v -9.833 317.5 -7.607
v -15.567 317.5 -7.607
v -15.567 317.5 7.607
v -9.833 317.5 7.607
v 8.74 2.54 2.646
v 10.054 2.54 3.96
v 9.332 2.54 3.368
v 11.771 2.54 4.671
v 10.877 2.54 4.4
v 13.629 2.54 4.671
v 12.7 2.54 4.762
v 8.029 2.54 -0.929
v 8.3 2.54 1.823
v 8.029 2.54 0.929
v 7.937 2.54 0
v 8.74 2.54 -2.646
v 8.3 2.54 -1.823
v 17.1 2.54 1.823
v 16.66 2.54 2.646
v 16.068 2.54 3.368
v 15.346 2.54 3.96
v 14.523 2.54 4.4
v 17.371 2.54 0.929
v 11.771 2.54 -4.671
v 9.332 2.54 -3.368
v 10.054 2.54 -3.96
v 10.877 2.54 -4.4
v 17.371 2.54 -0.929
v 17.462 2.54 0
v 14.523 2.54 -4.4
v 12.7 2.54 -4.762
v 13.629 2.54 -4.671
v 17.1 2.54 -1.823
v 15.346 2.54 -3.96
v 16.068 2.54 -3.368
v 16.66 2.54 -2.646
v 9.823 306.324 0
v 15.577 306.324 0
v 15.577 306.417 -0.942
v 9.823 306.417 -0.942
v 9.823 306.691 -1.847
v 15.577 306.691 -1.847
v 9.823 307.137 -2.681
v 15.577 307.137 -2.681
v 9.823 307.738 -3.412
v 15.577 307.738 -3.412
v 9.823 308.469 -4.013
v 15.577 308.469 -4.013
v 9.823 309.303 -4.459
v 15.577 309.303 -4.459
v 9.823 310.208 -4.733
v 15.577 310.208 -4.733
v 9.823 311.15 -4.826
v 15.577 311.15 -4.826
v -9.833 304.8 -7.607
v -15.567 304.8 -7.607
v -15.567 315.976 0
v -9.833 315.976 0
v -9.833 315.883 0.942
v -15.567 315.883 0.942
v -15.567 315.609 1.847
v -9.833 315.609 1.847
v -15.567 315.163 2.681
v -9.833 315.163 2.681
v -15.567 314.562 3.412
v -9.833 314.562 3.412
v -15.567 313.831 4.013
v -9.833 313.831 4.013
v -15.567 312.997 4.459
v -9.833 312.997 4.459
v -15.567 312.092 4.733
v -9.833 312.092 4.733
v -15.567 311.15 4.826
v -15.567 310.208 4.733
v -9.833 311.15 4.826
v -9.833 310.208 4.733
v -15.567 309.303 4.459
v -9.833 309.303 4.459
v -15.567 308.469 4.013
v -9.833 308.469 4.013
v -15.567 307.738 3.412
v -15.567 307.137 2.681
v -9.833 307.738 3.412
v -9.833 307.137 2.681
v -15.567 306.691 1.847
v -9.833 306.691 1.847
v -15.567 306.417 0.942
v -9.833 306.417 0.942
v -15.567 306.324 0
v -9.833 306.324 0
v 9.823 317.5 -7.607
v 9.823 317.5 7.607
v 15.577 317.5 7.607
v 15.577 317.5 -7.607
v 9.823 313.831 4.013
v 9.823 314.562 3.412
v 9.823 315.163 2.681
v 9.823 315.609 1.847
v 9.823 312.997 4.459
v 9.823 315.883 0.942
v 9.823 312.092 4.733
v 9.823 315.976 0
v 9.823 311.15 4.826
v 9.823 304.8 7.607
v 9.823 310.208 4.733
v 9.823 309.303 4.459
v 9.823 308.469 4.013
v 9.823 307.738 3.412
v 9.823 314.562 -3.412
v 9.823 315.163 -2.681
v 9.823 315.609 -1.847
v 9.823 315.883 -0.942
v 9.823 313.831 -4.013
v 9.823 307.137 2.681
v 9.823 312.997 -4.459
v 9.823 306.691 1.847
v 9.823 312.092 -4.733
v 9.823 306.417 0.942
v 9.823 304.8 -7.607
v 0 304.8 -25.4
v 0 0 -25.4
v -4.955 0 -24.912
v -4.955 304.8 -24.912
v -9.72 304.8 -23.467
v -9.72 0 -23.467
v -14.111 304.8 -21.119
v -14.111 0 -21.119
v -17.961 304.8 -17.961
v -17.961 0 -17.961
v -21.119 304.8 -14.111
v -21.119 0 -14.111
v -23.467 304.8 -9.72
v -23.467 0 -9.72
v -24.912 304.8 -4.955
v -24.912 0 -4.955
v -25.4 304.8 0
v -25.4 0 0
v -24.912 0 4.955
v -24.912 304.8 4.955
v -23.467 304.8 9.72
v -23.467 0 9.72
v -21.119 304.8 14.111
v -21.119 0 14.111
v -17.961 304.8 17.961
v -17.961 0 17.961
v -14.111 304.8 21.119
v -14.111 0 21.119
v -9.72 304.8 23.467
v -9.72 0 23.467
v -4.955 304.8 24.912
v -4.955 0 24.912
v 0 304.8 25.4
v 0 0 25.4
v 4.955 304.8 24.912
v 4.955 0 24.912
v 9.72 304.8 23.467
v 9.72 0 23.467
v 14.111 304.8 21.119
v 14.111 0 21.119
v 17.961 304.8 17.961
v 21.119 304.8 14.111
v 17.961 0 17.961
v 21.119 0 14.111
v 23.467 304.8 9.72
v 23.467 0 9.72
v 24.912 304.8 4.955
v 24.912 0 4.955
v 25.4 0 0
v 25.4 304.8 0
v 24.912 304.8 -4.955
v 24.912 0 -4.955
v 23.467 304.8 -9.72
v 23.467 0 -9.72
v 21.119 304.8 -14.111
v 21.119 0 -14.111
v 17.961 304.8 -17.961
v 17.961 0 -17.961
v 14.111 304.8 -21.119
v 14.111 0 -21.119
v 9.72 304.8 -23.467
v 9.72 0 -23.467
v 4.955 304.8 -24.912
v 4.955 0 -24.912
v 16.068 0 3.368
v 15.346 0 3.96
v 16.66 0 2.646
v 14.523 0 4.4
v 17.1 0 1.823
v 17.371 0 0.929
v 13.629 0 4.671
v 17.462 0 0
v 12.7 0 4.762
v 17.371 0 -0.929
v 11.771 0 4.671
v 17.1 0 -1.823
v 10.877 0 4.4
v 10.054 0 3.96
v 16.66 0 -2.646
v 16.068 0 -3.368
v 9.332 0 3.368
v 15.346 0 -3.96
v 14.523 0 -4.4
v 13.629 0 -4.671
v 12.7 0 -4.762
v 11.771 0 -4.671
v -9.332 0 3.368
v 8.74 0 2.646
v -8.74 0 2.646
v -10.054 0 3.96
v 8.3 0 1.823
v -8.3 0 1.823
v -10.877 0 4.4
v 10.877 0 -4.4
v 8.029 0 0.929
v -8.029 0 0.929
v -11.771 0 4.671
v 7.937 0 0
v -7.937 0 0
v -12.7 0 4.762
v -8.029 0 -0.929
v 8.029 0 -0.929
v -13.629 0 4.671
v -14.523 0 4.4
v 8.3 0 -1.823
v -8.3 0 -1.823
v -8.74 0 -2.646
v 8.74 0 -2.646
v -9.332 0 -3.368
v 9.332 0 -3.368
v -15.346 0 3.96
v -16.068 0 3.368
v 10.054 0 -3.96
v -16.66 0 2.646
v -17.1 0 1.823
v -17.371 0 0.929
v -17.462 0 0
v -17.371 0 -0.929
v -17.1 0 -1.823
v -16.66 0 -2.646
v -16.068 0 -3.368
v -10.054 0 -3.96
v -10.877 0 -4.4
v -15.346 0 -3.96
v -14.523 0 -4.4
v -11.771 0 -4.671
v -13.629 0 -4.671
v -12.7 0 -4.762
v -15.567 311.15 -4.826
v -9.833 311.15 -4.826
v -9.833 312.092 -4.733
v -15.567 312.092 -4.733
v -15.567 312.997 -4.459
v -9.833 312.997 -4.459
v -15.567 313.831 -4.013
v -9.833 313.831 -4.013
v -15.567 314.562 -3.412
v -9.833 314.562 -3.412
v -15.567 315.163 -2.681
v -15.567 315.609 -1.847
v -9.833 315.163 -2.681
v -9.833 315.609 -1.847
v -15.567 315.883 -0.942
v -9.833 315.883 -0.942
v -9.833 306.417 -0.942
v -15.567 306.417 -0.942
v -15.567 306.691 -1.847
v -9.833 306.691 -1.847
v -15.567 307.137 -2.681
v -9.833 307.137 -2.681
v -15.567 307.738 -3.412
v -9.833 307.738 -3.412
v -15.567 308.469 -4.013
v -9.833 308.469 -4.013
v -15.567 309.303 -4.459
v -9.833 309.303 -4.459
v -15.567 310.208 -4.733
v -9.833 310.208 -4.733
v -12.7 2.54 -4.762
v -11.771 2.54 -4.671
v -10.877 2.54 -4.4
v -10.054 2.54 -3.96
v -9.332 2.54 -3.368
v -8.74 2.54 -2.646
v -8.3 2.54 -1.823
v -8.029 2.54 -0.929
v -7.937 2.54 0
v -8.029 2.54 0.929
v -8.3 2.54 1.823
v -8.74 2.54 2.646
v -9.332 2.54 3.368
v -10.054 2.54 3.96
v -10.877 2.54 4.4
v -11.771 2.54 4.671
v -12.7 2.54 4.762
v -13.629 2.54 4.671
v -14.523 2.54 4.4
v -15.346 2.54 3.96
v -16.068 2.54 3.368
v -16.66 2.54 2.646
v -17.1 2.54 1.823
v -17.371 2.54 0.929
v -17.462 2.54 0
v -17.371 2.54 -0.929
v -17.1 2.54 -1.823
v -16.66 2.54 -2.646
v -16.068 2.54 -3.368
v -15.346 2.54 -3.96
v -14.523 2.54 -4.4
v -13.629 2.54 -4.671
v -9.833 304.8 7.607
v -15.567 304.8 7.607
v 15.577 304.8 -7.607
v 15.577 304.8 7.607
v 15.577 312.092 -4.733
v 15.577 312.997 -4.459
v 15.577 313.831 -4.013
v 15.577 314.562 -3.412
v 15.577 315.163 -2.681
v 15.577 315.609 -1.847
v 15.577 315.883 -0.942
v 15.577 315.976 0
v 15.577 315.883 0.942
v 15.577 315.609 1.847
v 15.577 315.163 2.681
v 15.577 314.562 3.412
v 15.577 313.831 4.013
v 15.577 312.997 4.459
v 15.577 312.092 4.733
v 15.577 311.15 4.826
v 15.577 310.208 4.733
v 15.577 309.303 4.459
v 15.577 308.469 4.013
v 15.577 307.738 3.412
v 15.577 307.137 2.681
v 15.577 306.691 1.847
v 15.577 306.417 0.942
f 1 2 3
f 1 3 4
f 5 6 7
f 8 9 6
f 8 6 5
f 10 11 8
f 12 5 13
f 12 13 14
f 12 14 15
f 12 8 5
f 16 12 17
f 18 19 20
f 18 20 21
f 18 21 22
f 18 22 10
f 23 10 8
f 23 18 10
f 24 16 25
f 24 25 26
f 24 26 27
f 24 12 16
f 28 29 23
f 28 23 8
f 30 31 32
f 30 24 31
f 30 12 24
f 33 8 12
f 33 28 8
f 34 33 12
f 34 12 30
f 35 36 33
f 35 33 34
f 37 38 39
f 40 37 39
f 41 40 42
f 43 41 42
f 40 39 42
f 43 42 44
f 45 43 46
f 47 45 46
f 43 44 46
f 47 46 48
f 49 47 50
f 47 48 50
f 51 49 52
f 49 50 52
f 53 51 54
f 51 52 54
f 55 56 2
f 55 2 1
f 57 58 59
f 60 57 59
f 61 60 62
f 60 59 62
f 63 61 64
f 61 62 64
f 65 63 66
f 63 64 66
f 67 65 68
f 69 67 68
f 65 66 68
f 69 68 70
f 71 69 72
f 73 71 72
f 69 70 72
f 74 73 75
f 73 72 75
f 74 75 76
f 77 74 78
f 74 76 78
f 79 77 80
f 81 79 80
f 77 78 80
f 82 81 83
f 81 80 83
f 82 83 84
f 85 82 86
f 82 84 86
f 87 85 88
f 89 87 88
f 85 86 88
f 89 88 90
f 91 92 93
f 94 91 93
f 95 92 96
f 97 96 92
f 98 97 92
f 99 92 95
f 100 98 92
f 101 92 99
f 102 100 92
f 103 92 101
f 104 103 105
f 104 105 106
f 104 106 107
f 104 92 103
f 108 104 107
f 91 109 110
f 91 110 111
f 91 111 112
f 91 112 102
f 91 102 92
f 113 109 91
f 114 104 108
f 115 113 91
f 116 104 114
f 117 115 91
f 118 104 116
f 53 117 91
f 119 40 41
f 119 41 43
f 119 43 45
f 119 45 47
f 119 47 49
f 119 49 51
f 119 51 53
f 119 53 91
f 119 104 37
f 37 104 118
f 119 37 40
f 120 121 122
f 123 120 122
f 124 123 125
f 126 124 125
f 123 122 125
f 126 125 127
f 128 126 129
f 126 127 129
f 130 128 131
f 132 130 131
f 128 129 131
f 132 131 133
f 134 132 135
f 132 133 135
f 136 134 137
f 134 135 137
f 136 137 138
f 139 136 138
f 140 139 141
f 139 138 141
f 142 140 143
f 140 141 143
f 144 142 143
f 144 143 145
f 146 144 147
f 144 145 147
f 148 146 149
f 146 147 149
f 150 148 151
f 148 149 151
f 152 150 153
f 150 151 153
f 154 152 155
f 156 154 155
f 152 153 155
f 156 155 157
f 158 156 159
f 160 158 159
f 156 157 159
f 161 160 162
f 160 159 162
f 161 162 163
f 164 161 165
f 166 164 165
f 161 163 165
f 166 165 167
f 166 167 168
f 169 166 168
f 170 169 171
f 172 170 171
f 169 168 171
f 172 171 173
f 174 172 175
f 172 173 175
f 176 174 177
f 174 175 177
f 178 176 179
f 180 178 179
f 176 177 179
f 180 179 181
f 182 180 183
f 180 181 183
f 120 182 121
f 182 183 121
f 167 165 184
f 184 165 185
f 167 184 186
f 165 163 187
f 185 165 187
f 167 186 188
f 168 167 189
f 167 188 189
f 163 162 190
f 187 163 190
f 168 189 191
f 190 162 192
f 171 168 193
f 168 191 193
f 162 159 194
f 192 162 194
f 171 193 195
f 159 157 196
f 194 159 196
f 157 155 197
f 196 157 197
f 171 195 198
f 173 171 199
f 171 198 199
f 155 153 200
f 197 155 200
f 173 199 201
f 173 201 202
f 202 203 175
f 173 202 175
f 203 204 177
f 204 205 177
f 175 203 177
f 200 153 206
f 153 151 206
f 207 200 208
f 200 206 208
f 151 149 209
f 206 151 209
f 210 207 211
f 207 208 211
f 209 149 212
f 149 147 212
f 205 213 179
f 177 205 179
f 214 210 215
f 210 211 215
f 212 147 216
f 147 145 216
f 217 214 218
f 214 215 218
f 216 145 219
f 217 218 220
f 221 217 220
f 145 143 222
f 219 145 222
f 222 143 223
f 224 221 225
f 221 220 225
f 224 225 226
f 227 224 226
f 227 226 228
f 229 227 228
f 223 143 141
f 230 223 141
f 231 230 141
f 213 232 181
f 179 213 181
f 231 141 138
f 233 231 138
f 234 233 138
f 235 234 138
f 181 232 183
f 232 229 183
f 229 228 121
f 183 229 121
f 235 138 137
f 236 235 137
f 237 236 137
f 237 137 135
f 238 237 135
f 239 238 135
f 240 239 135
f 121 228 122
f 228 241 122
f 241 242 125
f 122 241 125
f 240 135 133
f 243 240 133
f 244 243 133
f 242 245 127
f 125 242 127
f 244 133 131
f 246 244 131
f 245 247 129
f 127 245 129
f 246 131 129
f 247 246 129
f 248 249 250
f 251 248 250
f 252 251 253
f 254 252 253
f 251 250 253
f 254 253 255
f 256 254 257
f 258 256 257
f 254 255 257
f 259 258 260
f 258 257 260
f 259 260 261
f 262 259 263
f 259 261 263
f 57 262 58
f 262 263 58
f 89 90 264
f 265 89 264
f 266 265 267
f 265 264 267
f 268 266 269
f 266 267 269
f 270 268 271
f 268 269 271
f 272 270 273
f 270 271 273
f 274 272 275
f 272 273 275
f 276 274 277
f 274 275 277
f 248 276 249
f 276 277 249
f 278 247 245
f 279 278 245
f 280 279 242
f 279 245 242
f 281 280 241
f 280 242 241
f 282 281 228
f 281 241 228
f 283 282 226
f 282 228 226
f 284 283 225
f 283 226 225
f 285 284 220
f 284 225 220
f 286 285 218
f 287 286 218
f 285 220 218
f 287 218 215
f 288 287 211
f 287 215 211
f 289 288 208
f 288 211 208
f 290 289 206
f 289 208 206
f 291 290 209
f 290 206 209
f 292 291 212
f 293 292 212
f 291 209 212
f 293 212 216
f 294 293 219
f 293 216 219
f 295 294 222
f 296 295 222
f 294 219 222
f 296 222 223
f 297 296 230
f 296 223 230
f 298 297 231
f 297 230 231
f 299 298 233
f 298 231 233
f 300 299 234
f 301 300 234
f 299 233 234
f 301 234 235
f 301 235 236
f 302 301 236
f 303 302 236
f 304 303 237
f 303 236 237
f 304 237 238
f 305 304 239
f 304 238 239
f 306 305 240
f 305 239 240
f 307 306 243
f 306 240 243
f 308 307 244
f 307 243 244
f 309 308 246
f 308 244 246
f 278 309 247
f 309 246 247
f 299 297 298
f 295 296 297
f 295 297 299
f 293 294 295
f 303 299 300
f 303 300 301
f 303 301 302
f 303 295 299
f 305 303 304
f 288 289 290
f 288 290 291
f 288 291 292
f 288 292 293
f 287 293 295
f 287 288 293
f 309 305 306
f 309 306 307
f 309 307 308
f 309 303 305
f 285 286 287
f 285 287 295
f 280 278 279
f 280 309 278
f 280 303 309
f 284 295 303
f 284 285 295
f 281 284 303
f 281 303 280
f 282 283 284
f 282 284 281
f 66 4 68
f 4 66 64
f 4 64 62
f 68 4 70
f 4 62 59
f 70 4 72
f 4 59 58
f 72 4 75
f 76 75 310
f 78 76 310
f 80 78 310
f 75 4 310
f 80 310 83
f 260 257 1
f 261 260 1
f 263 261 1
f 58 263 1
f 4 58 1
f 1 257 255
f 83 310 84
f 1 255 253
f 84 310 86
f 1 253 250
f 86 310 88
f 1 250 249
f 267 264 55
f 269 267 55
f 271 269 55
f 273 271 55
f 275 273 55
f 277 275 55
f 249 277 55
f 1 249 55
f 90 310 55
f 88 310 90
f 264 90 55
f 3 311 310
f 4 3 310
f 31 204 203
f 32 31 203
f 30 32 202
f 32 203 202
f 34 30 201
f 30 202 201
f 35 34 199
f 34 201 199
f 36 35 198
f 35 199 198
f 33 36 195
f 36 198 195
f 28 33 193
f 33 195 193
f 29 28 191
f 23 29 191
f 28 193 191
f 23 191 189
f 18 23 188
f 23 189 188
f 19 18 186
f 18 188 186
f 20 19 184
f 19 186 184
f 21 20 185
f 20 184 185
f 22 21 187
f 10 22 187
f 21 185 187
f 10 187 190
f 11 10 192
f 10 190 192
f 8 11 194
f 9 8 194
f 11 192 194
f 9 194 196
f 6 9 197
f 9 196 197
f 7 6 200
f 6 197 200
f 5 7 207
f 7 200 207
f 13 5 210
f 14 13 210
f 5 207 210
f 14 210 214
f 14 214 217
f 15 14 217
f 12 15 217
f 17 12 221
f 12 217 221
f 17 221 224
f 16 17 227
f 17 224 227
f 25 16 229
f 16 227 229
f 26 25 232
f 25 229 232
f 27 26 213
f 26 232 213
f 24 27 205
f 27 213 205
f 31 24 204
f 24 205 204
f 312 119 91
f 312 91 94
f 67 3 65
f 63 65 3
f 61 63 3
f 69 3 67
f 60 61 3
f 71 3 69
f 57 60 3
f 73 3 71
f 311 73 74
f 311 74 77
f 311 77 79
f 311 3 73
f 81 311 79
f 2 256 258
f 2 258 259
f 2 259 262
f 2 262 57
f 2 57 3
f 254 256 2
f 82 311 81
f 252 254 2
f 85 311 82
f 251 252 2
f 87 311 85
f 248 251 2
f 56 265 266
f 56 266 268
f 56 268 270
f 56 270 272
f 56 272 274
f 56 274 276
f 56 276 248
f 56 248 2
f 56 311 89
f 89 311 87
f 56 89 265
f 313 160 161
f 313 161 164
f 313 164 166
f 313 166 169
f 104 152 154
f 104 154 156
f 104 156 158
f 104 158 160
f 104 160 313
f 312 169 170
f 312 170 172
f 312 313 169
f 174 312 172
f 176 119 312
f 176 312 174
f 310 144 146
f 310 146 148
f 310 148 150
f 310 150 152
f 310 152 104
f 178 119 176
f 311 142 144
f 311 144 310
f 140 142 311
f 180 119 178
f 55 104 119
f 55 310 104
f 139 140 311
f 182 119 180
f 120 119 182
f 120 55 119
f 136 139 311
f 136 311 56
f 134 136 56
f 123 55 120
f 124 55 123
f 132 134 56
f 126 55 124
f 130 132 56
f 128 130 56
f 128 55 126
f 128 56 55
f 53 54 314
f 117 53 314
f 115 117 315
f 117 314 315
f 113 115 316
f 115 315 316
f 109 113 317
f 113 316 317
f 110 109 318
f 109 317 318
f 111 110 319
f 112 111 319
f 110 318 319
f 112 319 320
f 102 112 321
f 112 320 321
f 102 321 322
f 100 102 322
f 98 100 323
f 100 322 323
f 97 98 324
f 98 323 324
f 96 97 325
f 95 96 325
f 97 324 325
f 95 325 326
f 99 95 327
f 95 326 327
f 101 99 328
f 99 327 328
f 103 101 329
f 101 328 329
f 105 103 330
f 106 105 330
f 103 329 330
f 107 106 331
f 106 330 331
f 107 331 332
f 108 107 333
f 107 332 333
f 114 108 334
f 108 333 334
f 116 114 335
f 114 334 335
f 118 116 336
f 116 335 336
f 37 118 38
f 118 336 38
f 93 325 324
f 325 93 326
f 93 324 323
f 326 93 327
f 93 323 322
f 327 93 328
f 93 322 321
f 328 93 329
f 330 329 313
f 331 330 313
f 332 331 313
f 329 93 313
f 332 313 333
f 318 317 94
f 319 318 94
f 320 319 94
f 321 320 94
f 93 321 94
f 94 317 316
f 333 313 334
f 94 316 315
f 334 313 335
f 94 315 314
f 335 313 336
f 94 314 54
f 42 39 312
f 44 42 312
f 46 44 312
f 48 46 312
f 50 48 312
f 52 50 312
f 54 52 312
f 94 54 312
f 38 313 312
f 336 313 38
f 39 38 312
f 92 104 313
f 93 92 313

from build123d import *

# Parameters (mm, degrees)
SKETCH1_R           = 25.4
BOSS_EXTRUDE1_DEPTH = 304.8
SKETCH3_W           = 5.753643288
SKETCH3_H           = 15.213425176
SKETCH3_W_2         = 5.733174908
BOSS_EXTRUDE2_DEPTH = 12.7
CUT_EXTRUDE2_DEPTH  = 62.738
SKETCH6_R           = 4.7625
CUT_EXTRUDE3_DEPTH  = 2.54


with BuildPart() as part:
    # Sketch1 → Boss-Extrude1 (new body)
    with BuildSketch(Plane(origin=(0, 0, 0), x_dir=(1, 0, 0), z_dir=(0, 1, 0))):
        with Locations(Location((0, 0, 0), (0, 0, 90))):
            Circle(SKETCH1_R)
    extrude(amount=BOSS_EXTRUDE1_DEPTH)

    # Sketch3 → Boss-Extrude2 (add)
    with BuildSketch(Plane(origin=(0, 304.8, 0), x_dir=(1, 0, 0), z_dir=(0, 1, 0))):
        with Locations((12.7, 0)):
            Rectangle(SKETCH3_W, SKETCH3_H)
        with Locations((-12.7, 0)):
            Rectangle(SKETCH3_W_2, SKETCH3_H)
    extrude(amount=BOSS_EXTRUDE2_DEPTH)

    # Sketch4 → Cut-Extrude2 (cut)
    with BuildSketch(Plane(origin=(15.576821644, 0, 0), x_dir=(0, 0, -1), z_dir=(1, 0, 0))):
        with BuildLine():
            ThreePointArc((4.826, 311.15), (3.412497326, 314.562497326), (0, 315.976))
            Line((0, 315.976), (0, 306.324))
            ThreePointArc((0, 306.324), (3.412497326, 307.737502674), (4.826, 311.15))
        make_face()
        with BuildLine():
            Line((0, 306.324), (0, 315.976))
            ThreePointArc((0, 315.976), (-4.826, 311.15), (0, 306.324))
        make_face()
    extrude(amount=-CUT_EXTRUDE2_DEPTH, mode=Mode.SUBTRACT)

    # Sketch6 → Cut-Extrude3 (cut)
    with BuildSketch(Plane.XZ):
        with Locations(Location((-12.7, 0, 0), (0, 0, 270))):
            Circle(SKETCH6_R)
        with Locations(Location((12.7, 0, 0), (0, 0, 270))):
            Circle(SKETCH6_R)
    extrude(amount=-CUT_EXTRUDE3_DEPTH, mode=Mode.SUBTRACT)


solid = part.part
